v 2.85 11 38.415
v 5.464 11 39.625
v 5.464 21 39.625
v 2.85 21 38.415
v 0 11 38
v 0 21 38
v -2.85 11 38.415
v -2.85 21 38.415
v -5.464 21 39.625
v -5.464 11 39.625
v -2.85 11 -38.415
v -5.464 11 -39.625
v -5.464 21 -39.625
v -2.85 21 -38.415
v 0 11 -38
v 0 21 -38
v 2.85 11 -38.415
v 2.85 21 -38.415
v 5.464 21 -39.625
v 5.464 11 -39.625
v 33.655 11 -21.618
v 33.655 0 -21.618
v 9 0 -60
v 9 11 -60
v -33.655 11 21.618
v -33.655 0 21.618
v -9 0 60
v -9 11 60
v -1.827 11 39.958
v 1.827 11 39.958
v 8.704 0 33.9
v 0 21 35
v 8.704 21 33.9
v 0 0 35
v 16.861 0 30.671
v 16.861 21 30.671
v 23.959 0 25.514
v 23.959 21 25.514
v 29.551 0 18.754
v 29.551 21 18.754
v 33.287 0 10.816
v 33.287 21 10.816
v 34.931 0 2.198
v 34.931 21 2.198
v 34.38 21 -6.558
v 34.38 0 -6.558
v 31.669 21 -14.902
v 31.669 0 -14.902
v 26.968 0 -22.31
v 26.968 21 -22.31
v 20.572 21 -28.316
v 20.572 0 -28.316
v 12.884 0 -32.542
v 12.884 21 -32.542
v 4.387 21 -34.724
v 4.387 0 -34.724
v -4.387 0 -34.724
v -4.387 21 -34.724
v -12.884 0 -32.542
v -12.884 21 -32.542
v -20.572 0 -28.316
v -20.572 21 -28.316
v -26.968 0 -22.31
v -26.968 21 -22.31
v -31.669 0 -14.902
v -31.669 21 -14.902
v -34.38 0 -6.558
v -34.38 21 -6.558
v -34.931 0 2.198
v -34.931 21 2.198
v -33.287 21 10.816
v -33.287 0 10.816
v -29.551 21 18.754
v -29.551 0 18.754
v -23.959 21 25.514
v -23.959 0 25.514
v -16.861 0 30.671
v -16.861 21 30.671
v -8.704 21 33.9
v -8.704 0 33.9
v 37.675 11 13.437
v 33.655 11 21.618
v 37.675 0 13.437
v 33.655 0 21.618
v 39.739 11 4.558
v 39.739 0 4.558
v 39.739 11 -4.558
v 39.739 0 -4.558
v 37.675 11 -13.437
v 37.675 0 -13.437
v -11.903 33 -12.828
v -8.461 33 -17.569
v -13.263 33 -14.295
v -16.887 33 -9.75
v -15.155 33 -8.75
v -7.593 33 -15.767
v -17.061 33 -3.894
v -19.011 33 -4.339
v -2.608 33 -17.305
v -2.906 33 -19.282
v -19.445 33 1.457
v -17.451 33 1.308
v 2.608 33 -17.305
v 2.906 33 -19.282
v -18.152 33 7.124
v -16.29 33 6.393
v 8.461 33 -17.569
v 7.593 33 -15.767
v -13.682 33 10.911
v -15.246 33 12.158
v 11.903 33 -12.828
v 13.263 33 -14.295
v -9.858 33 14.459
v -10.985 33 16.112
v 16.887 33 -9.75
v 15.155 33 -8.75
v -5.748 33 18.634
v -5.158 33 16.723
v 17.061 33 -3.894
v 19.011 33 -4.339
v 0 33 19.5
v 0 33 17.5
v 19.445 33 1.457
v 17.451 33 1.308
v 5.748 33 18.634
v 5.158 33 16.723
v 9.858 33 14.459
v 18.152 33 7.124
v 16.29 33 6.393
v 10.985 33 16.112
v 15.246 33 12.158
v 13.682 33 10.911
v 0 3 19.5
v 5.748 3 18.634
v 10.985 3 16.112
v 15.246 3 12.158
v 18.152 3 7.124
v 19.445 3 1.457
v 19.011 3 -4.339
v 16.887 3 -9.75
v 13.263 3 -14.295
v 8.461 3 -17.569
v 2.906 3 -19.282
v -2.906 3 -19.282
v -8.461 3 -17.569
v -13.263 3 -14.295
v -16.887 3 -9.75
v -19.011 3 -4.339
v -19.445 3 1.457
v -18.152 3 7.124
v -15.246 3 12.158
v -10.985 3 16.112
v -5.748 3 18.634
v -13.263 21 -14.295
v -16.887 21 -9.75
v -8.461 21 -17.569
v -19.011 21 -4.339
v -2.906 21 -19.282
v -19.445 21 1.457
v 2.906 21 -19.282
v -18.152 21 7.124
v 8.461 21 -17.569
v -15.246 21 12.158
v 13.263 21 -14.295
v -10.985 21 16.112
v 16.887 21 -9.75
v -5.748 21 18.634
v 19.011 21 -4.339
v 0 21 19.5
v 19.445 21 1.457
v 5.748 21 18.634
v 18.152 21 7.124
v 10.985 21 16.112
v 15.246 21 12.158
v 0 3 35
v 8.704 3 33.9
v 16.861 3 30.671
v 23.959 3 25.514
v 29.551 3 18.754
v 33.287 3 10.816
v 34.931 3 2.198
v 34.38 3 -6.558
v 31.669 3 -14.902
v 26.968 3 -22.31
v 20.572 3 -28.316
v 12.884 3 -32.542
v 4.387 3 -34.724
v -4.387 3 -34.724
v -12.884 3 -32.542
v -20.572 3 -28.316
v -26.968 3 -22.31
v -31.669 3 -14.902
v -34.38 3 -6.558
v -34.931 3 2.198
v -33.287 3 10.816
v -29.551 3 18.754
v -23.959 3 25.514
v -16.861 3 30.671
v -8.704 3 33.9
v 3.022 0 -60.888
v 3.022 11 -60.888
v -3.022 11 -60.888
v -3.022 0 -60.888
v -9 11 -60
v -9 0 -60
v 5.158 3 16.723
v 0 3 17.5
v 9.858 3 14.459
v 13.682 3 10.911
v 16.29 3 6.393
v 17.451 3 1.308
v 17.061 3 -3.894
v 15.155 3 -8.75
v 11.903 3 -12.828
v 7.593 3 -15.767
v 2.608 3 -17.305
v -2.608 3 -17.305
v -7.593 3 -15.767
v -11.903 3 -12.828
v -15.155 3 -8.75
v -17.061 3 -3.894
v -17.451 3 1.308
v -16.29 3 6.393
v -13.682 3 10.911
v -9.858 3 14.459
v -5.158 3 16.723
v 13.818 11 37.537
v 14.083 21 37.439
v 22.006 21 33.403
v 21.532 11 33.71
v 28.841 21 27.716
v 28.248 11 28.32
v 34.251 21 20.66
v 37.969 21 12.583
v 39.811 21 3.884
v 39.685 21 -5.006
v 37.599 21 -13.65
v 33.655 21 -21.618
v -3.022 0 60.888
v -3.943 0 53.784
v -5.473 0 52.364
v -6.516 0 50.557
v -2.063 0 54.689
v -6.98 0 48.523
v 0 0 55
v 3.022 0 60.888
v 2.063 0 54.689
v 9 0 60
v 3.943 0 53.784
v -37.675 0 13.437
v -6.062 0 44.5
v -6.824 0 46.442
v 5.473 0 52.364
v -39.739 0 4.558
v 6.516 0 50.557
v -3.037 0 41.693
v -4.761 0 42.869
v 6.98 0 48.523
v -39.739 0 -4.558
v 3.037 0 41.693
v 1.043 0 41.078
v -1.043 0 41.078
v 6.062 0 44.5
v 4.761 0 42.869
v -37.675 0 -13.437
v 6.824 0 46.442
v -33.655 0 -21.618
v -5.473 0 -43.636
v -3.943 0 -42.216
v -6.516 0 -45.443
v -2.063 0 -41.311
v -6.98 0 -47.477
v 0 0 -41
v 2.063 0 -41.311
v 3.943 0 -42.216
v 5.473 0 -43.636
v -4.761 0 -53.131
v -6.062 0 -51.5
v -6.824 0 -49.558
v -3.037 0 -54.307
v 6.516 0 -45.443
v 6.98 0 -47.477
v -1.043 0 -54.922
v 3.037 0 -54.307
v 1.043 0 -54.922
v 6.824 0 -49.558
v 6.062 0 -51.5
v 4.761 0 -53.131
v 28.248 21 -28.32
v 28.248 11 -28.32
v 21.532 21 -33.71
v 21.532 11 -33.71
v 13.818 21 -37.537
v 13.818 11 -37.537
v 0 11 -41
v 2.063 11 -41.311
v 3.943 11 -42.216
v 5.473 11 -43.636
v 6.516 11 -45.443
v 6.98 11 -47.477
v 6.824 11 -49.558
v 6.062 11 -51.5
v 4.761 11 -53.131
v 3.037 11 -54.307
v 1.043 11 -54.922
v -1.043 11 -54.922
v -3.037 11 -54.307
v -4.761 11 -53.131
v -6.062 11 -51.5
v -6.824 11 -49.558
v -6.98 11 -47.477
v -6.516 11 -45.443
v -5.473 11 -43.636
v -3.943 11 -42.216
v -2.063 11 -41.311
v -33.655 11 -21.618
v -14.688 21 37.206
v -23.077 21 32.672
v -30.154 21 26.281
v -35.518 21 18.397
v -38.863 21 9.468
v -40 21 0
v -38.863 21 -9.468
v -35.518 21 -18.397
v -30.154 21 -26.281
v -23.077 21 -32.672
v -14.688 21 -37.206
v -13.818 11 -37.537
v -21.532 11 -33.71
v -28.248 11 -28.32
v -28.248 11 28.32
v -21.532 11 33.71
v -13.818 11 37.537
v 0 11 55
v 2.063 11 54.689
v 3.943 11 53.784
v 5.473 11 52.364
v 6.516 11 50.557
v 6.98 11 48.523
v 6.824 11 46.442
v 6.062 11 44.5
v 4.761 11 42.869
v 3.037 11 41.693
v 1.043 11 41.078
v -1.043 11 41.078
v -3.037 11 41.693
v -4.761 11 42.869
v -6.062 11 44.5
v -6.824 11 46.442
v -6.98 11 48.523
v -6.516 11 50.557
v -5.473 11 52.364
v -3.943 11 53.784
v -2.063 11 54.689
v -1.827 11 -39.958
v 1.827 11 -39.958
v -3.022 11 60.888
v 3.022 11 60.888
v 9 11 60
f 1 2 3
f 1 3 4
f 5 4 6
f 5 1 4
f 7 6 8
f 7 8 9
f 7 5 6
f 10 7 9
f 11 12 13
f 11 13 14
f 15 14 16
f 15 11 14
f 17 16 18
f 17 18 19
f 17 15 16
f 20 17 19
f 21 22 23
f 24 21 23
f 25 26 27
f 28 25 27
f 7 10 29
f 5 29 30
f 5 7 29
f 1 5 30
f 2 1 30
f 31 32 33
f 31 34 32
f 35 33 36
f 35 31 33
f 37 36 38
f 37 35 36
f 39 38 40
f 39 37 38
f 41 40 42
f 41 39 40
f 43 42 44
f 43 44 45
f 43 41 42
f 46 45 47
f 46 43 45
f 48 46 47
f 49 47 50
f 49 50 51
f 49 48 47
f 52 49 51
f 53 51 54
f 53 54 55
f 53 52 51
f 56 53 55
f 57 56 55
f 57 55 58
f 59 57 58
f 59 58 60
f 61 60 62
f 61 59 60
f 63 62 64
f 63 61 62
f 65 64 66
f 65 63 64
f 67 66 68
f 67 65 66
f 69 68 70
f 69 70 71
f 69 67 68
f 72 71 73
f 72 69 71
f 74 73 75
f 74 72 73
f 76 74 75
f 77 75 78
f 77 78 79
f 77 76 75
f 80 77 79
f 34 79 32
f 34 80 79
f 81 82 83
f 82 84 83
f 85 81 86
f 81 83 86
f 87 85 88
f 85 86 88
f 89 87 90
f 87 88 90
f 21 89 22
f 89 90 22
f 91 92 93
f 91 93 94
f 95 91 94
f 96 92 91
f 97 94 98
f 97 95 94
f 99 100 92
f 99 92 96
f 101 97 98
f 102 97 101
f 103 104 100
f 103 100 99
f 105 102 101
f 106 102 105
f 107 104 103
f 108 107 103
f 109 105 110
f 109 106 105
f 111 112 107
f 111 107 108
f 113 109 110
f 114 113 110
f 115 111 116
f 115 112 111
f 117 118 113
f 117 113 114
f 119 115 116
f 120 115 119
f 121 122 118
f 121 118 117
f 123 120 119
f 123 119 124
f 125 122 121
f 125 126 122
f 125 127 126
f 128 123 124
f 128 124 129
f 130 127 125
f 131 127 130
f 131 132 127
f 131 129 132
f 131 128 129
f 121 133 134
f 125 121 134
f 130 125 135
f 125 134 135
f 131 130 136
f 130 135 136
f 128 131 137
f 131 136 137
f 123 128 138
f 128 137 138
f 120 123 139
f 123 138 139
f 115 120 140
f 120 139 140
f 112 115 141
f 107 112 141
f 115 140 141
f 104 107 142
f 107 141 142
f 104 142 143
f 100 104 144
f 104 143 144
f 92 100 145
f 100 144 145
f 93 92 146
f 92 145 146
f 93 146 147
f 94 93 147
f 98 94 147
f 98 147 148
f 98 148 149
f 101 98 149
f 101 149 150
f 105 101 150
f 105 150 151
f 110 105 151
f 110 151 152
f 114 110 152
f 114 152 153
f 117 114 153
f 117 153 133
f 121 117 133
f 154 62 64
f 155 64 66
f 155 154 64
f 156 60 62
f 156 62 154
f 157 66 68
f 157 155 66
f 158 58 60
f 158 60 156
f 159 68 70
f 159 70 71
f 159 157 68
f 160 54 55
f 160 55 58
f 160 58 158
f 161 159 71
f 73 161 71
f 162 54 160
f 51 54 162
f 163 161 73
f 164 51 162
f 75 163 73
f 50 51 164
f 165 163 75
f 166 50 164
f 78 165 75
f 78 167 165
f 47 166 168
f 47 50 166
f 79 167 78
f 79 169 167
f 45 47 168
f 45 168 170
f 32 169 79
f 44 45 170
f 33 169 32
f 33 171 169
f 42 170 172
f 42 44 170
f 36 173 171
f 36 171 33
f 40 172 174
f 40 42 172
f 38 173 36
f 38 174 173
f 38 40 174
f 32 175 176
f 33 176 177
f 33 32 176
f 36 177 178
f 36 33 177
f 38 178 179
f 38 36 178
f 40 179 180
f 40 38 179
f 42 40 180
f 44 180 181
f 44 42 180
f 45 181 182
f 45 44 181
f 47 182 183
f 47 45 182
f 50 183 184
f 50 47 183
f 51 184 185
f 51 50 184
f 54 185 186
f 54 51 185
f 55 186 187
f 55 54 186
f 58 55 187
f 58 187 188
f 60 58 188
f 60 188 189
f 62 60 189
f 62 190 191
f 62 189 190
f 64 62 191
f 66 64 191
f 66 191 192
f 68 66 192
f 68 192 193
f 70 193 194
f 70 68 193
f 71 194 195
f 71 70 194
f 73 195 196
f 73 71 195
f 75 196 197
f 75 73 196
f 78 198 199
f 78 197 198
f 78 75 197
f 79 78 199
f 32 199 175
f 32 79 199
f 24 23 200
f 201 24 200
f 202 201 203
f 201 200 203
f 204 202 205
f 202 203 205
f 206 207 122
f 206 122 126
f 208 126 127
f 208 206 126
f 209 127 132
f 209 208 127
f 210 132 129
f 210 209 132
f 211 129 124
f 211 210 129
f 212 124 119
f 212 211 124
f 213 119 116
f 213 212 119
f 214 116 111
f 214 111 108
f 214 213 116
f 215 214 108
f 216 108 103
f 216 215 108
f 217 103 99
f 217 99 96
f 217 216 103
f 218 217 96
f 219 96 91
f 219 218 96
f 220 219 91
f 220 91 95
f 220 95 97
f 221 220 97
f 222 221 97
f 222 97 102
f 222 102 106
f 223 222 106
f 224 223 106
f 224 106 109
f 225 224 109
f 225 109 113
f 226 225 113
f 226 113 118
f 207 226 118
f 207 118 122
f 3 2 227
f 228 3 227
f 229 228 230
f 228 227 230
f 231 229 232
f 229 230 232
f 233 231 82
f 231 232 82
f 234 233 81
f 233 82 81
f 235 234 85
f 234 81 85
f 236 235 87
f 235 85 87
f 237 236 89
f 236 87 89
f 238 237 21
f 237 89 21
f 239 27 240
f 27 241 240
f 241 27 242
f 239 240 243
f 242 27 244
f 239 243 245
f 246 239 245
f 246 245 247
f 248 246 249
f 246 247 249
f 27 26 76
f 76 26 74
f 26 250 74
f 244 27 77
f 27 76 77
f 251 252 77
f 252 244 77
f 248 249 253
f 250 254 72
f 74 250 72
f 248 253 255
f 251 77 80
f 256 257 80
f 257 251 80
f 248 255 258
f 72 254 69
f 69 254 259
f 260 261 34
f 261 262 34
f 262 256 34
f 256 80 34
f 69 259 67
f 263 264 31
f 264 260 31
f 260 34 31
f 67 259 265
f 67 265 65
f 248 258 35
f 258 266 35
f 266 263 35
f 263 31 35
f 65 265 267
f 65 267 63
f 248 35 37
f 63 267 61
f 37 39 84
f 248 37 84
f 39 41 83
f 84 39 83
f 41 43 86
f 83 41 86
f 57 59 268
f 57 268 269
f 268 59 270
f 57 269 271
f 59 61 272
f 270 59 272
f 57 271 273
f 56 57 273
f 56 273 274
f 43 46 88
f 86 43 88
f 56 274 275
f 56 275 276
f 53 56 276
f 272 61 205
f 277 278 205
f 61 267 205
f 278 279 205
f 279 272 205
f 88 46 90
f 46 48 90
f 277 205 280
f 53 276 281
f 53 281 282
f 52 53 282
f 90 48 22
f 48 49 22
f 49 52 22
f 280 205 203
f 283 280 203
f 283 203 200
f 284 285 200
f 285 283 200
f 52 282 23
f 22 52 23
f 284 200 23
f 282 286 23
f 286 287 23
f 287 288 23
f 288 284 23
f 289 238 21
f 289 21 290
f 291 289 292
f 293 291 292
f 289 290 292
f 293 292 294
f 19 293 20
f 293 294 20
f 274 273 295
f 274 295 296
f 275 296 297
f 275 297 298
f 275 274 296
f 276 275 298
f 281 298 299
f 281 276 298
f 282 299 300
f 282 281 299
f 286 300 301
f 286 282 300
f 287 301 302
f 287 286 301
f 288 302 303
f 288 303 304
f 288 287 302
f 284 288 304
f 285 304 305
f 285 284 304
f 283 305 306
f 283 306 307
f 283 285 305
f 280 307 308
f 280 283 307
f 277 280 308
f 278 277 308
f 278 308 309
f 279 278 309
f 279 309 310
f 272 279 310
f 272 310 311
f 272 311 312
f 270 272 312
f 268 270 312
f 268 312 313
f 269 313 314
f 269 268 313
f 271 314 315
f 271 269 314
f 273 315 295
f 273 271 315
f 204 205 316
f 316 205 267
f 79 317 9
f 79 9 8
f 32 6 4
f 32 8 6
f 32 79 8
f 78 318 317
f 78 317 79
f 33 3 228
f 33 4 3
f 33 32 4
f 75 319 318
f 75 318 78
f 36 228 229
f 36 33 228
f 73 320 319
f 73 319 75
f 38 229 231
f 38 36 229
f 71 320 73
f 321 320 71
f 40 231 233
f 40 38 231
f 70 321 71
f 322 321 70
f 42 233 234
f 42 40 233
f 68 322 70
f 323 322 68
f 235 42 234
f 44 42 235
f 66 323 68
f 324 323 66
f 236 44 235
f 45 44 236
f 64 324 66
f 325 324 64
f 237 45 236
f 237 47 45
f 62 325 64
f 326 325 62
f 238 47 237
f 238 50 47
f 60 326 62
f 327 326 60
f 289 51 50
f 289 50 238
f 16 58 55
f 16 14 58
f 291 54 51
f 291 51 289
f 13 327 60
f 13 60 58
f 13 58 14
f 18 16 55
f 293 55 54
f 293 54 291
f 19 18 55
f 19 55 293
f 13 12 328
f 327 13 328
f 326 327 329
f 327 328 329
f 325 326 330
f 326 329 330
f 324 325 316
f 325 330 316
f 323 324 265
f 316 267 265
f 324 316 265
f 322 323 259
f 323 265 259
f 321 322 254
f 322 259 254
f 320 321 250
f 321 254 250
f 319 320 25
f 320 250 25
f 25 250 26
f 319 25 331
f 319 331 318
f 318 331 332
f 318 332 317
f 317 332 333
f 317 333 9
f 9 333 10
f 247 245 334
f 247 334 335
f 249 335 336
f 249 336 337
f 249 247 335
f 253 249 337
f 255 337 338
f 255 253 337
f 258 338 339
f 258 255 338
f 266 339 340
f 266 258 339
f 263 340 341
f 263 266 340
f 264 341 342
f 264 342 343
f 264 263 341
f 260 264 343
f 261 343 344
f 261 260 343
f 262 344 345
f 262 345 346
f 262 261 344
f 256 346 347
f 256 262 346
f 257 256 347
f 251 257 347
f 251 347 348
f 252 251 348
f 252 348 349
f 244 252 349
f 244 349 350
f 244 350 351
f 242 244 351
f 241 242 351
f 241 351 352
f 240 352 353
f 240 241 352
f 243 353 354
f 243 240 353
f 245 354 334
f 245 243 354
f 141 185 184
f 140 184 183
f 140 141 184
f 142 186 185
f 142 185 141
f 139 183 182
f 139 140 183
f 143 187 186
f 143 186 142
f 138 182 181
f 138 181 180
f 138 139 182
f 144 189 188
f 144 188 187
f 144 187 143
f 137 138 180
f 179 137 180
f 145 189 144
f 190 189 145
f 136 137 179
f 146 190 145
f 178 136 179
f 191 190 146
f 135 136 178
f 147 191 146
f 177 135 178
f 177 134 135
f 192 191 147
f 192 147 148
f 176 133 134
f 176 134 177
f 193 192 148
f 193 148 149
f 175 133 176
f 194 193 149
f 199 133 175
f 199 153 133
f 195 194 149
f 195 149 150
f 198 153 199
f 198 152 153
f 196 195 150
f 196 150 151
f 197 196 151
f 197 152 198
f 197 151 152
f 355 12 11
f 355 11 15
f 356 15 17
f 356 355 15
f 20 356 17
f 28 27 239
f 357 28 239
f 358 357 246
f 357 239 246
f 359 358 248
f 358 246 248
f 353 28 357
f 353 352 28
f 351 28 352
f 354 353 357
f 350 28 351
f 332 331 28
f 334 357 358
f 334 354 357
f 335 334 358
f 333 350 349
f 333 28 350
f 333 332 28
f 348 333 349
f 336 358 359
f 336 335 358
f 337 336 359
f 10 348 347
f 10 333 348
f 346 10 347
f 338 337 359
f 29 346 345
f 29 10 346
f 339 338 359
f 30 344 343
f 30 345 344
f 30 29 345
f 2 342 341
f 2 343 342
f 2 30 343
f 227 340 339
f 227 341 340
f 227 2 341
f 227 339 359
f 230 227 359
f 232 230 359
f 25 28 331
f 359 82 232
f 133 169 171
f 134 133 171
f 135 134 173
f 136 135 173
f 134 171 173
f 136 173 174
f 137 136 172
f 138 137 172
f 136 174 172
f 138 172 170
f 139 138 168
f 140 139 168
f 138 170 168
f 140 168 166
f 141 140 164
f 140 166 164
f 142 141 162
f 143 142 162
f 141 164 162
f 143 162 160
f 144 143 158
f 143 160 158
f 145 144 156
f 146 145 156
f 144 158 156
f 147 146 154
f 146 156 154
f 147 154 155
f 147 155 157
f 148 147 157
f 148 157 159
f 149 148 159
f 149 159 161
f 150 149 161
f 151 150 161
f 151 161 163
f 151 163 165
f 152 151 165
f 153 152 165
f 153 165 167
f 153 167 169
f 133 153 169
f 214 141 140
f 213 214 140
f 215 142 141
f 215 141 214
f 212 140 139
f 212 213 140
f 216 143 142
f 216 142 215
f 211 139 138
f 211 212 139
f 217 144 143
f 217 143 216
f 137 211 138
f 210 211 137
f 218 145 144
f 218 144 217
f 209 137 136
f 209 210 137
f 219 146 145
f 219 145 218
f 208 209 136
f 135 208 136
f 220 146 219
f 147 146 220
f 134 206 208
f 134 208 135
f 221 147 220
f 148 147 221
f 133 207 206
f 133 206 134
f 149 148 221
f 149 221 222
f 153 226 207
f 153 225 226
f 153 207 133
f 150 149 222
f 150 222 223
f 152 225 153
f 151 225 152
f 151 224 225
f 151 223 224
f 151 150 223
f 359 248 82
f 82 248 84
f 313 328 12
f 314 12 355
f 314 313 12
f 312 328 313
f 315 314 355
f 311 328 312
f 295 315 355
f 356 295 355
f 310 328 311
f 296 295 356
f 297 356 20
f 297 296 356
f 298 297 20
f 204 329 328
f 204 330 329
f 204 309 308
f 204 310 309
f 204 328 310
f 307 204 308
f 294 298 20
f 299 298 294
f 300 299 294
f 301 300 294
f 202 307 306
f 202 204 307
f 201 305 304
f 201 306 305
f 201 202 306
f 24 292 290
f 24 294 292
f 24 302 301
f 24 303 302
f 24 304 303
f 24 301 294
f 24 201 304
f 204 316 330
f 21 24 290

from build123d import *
from build123d.topology import SkipClean

# Parameters (mm, degrees)
SKETCH1_R                = 7
SKETCH1_R_2              = 35
BOSS_EXTRUDE1_DEPTH      = 11
SKETCH2_R                = 40
SKETCH2_R_2              = 35
BOSS_EXTRUDE2_DEPTH      = 10
CUT_EXTRUDE1_START       = -10
CUT_EXTRUDE1_DEPTH       = 10
SKETCH4_R                = 35
SKETCH4_R_2              = 19.5
BOSS_EXTRUDE3_DEPTH      = 21
BOSS_EXTRUDE4_DEPTH      = 12
BOSS_EXTRUDE4_DEPTH_BACK = 21
SKETCH5_R                = 19.5
SKETCH5_R_2              = 17.5
SKETCH6_R                = 35
CUT_EXTRUDE2_DEPTH       = 3


# Read off the part's stored shape, not the designer's step: Cut-Extrude1
with BuildPart() as part:
    # Sketch1 → Boss-Extrude1 (new body)
    # profile 1 of 3: a face of its own
    with BuildSketch(Plane(origin=(0, 0, 0), x_dir=(1, 0, 0), z_dir=(0, 1, 0))):
        with BuildLine():
            Line((-9, 60), (-33.654753977, 21.61845357))
            ThreePointArc((-33.654753977, 21.61845357), (-21.532195831, 33.710006566), (-5.464373249, 39.625))
            ThreePointArc((-5.464373249, 39.625), (0, 38), (5.464373249, 39.625))
            ThreePointArc((5.464373249, 39.625), (21.532195831, 33.710006566), (33.654753977, 21.61845357))
            Line((33.654753977, 21.61845357), (9, 60))
            ThreePointArc((9, 60), (0, 61), (-9, 60))
        make_face()
        with Locations(Location((0, 48, 0), (0, 0, 270))):
            Circle(SKETCH1_R, mode=Mode.SUBTRACT)
    # profile 2 of 3: a face of its own
    with BuildSketch(Plane(origin=(0, 0, 0), x_dir=(1, 0, 0), z_dir=(0, 1, 0))):
        with BuildLine():
            ThreePointArc((-5.464373249, -39.625), (0, -38), (5.464373249, -39.625))
            ThreePointArc((5.464373249, -39.625), (40, 0), (5.464373249, 39.625))
            ThreePointArc((5.464373249, 39.625), (0, 38), (-5.464373249, 39.625))
            ThreePointArc((-5.464373249, 39.625), (-40, 0), (-5.464373249, -39.625))
        make_face()
        with Locations(Location((0, 0, 0), (0, 0, 270))):
            Circle(SKETCH1_R_2, mode=Mode.SUBTRACT)
    # profile 3 of 3: a face of its own
    with BuildSketch(Plane(origin=(0, 0, 0), x_dir=(1, 0, 0), z_dir=(0, 1, 0))):
        with BuildLine():
            ThreePointArc((-5.464373249, -39.625), (-21.532195831, -33.710006566), (-33.654753977, -21.61845357))
            Line((-33.654753977, -21.61845357), (-9, -60))
            ThreePointArc((-9, -60), (0, -61), (9, -60))
            Line((9, -60), (33.654753977, -21.61845357))
            ThreePointArc((33.654753977, -21.61845357), (21.532195831, -33.710006566), (5.464373249, -39.625))
            ThreePointArc((5.464373249, -39.625), (0, -38), (-5.464373249, -39.625))
        make_face()
        with Locations(Location((0, -48, 0), (0, 0, 270))):
            Circle(SKETCH1_R, mode=Mode.SUBTRACT)
    extrude(amount=BOSS_EXTRUDE1_DEPTH)

    # Sketch2 → Boss-Extrude2 (add)
    with BuildSketch(Plane(origin=(0, 11, 0), x_dir=(1, 0, 0), z_dir=(0, 1, 0))):
        with Locations(Location((0, 0, 0), (0, 0, 32.715049731))):
            Circle(SKETCH2_R)
        with Locations(Location((0, 0, 0), (0, 0, 270))):
            Circle(SKETCH2_R_2, mode=Mode.SUBTRACT)
    extrude(amount=BOSS_EXTRUDE2_DEPTH)

    # Cut-Extrude1 outline → Cut-Extrude1 (cut)
    with SkipClean():  # the faces are left unmerged after this step: merging them gives an invalid solid
        with BuildSketch(Plane(origin=(0, 21, 0), x_dir=(1, 0, 0), z_dir=(0, 1, 0)).offset(CUT_EXTRUDE1_START)):
            with BuildLine():
                ThreePointArc((-5.464373249, -39.625), (0, -40), (5.464373249, -39.625))
                ThreePointArc((5.464373249, -39.625), (0, -38), (-5.464373249, -39.625))
            make_face()
            with BuildLine():
                ThreePointArc((5.464373249, 39.625), (0, 40), (-5.464373249, 39.625))
                ThreePointArc((-5.464373249, 39.625), (0, 38), (5.464373249, 39.625))
            make_face()
        extrude(amount=CUT_EXTRUDE1_DEPTH, mode=Mode.SUBTRACT)


with BuildPart() as body_2:
    # Sketch4 → Boss-Extrude3 (new body)
    with BuildSketch(Plane(origin=(0, 21, 0), x_dir=(1, 0, 0), z_dir=(0, 1, 0))):
        with Locations(Location((0, 0, 0), (0, 0, 270))):
            Circle(SKETCH4_R)
        with Locations(Location((0, 0, 0), (0, 0, 270))):
            Circle(SKETCH4_R_2, mode=Mode.SUBTRACT)
    extrude(amount=-BOSS_EXTRUDE3_DEPTH)


with BuildPart() as body_3:
    # Sketch5 → Boss-Extrude4 (new, two sides: drawn at the far end of the back side and taken through both)
    with BuildSketch(Plane(origin=(0, 21, 0), x_dir=(1, 0, 0), z_dir=(0, 1, 0)).offset(-BOSS_EXTRUDE4_DEPTH_BACK)):
        with Locations(Location((0, 0, 0), (0, 0, 270))):
            Circle(SKETCH5_R)
        with Locations(Location((0, 0, 0), (0, 0, 270))):
            Circle(SKETCH5_R_2, mode=Mode.SUBTRACT)
    extrude(amount=BOSS_EXTRUDE4_DEPTH + BOSS_EXTRUDE4_DEPTH_BACK)


with BuildPart() as cut_extrude2_tool:
    # Sketch6 → Cut-Extrude2 (new body)
    with BuildSketch(Plane(origin=(0, 0, 0), x_dir=(-1, 0, 0), z_dir=(0, -1, 0))):
        with Locations(Location((0, 0, 0), (0, 0, 270))):
            Circle(SKETCH6_R)
    extrude(amount=-CUT_EXTRUDE2_DEPTH)


with BuildPart() as body_2_1:
    add(body_2.part)

    # Cut-Extrude2: cut by cut_extrude2_tool
    add(cut_extrude2_tool.part, mode=Mode.SUBTRACT)


with BuildPart() as body_3_1:
    add(body_3.part)

    # Cut-Extrude2: cut by cut_extrude2_tool
    add(cut_extrude2_tool.part, mode=Mode.SUBTRACT)


solid = Compound([part.part, body_2_1.part, body_3_1.part])
